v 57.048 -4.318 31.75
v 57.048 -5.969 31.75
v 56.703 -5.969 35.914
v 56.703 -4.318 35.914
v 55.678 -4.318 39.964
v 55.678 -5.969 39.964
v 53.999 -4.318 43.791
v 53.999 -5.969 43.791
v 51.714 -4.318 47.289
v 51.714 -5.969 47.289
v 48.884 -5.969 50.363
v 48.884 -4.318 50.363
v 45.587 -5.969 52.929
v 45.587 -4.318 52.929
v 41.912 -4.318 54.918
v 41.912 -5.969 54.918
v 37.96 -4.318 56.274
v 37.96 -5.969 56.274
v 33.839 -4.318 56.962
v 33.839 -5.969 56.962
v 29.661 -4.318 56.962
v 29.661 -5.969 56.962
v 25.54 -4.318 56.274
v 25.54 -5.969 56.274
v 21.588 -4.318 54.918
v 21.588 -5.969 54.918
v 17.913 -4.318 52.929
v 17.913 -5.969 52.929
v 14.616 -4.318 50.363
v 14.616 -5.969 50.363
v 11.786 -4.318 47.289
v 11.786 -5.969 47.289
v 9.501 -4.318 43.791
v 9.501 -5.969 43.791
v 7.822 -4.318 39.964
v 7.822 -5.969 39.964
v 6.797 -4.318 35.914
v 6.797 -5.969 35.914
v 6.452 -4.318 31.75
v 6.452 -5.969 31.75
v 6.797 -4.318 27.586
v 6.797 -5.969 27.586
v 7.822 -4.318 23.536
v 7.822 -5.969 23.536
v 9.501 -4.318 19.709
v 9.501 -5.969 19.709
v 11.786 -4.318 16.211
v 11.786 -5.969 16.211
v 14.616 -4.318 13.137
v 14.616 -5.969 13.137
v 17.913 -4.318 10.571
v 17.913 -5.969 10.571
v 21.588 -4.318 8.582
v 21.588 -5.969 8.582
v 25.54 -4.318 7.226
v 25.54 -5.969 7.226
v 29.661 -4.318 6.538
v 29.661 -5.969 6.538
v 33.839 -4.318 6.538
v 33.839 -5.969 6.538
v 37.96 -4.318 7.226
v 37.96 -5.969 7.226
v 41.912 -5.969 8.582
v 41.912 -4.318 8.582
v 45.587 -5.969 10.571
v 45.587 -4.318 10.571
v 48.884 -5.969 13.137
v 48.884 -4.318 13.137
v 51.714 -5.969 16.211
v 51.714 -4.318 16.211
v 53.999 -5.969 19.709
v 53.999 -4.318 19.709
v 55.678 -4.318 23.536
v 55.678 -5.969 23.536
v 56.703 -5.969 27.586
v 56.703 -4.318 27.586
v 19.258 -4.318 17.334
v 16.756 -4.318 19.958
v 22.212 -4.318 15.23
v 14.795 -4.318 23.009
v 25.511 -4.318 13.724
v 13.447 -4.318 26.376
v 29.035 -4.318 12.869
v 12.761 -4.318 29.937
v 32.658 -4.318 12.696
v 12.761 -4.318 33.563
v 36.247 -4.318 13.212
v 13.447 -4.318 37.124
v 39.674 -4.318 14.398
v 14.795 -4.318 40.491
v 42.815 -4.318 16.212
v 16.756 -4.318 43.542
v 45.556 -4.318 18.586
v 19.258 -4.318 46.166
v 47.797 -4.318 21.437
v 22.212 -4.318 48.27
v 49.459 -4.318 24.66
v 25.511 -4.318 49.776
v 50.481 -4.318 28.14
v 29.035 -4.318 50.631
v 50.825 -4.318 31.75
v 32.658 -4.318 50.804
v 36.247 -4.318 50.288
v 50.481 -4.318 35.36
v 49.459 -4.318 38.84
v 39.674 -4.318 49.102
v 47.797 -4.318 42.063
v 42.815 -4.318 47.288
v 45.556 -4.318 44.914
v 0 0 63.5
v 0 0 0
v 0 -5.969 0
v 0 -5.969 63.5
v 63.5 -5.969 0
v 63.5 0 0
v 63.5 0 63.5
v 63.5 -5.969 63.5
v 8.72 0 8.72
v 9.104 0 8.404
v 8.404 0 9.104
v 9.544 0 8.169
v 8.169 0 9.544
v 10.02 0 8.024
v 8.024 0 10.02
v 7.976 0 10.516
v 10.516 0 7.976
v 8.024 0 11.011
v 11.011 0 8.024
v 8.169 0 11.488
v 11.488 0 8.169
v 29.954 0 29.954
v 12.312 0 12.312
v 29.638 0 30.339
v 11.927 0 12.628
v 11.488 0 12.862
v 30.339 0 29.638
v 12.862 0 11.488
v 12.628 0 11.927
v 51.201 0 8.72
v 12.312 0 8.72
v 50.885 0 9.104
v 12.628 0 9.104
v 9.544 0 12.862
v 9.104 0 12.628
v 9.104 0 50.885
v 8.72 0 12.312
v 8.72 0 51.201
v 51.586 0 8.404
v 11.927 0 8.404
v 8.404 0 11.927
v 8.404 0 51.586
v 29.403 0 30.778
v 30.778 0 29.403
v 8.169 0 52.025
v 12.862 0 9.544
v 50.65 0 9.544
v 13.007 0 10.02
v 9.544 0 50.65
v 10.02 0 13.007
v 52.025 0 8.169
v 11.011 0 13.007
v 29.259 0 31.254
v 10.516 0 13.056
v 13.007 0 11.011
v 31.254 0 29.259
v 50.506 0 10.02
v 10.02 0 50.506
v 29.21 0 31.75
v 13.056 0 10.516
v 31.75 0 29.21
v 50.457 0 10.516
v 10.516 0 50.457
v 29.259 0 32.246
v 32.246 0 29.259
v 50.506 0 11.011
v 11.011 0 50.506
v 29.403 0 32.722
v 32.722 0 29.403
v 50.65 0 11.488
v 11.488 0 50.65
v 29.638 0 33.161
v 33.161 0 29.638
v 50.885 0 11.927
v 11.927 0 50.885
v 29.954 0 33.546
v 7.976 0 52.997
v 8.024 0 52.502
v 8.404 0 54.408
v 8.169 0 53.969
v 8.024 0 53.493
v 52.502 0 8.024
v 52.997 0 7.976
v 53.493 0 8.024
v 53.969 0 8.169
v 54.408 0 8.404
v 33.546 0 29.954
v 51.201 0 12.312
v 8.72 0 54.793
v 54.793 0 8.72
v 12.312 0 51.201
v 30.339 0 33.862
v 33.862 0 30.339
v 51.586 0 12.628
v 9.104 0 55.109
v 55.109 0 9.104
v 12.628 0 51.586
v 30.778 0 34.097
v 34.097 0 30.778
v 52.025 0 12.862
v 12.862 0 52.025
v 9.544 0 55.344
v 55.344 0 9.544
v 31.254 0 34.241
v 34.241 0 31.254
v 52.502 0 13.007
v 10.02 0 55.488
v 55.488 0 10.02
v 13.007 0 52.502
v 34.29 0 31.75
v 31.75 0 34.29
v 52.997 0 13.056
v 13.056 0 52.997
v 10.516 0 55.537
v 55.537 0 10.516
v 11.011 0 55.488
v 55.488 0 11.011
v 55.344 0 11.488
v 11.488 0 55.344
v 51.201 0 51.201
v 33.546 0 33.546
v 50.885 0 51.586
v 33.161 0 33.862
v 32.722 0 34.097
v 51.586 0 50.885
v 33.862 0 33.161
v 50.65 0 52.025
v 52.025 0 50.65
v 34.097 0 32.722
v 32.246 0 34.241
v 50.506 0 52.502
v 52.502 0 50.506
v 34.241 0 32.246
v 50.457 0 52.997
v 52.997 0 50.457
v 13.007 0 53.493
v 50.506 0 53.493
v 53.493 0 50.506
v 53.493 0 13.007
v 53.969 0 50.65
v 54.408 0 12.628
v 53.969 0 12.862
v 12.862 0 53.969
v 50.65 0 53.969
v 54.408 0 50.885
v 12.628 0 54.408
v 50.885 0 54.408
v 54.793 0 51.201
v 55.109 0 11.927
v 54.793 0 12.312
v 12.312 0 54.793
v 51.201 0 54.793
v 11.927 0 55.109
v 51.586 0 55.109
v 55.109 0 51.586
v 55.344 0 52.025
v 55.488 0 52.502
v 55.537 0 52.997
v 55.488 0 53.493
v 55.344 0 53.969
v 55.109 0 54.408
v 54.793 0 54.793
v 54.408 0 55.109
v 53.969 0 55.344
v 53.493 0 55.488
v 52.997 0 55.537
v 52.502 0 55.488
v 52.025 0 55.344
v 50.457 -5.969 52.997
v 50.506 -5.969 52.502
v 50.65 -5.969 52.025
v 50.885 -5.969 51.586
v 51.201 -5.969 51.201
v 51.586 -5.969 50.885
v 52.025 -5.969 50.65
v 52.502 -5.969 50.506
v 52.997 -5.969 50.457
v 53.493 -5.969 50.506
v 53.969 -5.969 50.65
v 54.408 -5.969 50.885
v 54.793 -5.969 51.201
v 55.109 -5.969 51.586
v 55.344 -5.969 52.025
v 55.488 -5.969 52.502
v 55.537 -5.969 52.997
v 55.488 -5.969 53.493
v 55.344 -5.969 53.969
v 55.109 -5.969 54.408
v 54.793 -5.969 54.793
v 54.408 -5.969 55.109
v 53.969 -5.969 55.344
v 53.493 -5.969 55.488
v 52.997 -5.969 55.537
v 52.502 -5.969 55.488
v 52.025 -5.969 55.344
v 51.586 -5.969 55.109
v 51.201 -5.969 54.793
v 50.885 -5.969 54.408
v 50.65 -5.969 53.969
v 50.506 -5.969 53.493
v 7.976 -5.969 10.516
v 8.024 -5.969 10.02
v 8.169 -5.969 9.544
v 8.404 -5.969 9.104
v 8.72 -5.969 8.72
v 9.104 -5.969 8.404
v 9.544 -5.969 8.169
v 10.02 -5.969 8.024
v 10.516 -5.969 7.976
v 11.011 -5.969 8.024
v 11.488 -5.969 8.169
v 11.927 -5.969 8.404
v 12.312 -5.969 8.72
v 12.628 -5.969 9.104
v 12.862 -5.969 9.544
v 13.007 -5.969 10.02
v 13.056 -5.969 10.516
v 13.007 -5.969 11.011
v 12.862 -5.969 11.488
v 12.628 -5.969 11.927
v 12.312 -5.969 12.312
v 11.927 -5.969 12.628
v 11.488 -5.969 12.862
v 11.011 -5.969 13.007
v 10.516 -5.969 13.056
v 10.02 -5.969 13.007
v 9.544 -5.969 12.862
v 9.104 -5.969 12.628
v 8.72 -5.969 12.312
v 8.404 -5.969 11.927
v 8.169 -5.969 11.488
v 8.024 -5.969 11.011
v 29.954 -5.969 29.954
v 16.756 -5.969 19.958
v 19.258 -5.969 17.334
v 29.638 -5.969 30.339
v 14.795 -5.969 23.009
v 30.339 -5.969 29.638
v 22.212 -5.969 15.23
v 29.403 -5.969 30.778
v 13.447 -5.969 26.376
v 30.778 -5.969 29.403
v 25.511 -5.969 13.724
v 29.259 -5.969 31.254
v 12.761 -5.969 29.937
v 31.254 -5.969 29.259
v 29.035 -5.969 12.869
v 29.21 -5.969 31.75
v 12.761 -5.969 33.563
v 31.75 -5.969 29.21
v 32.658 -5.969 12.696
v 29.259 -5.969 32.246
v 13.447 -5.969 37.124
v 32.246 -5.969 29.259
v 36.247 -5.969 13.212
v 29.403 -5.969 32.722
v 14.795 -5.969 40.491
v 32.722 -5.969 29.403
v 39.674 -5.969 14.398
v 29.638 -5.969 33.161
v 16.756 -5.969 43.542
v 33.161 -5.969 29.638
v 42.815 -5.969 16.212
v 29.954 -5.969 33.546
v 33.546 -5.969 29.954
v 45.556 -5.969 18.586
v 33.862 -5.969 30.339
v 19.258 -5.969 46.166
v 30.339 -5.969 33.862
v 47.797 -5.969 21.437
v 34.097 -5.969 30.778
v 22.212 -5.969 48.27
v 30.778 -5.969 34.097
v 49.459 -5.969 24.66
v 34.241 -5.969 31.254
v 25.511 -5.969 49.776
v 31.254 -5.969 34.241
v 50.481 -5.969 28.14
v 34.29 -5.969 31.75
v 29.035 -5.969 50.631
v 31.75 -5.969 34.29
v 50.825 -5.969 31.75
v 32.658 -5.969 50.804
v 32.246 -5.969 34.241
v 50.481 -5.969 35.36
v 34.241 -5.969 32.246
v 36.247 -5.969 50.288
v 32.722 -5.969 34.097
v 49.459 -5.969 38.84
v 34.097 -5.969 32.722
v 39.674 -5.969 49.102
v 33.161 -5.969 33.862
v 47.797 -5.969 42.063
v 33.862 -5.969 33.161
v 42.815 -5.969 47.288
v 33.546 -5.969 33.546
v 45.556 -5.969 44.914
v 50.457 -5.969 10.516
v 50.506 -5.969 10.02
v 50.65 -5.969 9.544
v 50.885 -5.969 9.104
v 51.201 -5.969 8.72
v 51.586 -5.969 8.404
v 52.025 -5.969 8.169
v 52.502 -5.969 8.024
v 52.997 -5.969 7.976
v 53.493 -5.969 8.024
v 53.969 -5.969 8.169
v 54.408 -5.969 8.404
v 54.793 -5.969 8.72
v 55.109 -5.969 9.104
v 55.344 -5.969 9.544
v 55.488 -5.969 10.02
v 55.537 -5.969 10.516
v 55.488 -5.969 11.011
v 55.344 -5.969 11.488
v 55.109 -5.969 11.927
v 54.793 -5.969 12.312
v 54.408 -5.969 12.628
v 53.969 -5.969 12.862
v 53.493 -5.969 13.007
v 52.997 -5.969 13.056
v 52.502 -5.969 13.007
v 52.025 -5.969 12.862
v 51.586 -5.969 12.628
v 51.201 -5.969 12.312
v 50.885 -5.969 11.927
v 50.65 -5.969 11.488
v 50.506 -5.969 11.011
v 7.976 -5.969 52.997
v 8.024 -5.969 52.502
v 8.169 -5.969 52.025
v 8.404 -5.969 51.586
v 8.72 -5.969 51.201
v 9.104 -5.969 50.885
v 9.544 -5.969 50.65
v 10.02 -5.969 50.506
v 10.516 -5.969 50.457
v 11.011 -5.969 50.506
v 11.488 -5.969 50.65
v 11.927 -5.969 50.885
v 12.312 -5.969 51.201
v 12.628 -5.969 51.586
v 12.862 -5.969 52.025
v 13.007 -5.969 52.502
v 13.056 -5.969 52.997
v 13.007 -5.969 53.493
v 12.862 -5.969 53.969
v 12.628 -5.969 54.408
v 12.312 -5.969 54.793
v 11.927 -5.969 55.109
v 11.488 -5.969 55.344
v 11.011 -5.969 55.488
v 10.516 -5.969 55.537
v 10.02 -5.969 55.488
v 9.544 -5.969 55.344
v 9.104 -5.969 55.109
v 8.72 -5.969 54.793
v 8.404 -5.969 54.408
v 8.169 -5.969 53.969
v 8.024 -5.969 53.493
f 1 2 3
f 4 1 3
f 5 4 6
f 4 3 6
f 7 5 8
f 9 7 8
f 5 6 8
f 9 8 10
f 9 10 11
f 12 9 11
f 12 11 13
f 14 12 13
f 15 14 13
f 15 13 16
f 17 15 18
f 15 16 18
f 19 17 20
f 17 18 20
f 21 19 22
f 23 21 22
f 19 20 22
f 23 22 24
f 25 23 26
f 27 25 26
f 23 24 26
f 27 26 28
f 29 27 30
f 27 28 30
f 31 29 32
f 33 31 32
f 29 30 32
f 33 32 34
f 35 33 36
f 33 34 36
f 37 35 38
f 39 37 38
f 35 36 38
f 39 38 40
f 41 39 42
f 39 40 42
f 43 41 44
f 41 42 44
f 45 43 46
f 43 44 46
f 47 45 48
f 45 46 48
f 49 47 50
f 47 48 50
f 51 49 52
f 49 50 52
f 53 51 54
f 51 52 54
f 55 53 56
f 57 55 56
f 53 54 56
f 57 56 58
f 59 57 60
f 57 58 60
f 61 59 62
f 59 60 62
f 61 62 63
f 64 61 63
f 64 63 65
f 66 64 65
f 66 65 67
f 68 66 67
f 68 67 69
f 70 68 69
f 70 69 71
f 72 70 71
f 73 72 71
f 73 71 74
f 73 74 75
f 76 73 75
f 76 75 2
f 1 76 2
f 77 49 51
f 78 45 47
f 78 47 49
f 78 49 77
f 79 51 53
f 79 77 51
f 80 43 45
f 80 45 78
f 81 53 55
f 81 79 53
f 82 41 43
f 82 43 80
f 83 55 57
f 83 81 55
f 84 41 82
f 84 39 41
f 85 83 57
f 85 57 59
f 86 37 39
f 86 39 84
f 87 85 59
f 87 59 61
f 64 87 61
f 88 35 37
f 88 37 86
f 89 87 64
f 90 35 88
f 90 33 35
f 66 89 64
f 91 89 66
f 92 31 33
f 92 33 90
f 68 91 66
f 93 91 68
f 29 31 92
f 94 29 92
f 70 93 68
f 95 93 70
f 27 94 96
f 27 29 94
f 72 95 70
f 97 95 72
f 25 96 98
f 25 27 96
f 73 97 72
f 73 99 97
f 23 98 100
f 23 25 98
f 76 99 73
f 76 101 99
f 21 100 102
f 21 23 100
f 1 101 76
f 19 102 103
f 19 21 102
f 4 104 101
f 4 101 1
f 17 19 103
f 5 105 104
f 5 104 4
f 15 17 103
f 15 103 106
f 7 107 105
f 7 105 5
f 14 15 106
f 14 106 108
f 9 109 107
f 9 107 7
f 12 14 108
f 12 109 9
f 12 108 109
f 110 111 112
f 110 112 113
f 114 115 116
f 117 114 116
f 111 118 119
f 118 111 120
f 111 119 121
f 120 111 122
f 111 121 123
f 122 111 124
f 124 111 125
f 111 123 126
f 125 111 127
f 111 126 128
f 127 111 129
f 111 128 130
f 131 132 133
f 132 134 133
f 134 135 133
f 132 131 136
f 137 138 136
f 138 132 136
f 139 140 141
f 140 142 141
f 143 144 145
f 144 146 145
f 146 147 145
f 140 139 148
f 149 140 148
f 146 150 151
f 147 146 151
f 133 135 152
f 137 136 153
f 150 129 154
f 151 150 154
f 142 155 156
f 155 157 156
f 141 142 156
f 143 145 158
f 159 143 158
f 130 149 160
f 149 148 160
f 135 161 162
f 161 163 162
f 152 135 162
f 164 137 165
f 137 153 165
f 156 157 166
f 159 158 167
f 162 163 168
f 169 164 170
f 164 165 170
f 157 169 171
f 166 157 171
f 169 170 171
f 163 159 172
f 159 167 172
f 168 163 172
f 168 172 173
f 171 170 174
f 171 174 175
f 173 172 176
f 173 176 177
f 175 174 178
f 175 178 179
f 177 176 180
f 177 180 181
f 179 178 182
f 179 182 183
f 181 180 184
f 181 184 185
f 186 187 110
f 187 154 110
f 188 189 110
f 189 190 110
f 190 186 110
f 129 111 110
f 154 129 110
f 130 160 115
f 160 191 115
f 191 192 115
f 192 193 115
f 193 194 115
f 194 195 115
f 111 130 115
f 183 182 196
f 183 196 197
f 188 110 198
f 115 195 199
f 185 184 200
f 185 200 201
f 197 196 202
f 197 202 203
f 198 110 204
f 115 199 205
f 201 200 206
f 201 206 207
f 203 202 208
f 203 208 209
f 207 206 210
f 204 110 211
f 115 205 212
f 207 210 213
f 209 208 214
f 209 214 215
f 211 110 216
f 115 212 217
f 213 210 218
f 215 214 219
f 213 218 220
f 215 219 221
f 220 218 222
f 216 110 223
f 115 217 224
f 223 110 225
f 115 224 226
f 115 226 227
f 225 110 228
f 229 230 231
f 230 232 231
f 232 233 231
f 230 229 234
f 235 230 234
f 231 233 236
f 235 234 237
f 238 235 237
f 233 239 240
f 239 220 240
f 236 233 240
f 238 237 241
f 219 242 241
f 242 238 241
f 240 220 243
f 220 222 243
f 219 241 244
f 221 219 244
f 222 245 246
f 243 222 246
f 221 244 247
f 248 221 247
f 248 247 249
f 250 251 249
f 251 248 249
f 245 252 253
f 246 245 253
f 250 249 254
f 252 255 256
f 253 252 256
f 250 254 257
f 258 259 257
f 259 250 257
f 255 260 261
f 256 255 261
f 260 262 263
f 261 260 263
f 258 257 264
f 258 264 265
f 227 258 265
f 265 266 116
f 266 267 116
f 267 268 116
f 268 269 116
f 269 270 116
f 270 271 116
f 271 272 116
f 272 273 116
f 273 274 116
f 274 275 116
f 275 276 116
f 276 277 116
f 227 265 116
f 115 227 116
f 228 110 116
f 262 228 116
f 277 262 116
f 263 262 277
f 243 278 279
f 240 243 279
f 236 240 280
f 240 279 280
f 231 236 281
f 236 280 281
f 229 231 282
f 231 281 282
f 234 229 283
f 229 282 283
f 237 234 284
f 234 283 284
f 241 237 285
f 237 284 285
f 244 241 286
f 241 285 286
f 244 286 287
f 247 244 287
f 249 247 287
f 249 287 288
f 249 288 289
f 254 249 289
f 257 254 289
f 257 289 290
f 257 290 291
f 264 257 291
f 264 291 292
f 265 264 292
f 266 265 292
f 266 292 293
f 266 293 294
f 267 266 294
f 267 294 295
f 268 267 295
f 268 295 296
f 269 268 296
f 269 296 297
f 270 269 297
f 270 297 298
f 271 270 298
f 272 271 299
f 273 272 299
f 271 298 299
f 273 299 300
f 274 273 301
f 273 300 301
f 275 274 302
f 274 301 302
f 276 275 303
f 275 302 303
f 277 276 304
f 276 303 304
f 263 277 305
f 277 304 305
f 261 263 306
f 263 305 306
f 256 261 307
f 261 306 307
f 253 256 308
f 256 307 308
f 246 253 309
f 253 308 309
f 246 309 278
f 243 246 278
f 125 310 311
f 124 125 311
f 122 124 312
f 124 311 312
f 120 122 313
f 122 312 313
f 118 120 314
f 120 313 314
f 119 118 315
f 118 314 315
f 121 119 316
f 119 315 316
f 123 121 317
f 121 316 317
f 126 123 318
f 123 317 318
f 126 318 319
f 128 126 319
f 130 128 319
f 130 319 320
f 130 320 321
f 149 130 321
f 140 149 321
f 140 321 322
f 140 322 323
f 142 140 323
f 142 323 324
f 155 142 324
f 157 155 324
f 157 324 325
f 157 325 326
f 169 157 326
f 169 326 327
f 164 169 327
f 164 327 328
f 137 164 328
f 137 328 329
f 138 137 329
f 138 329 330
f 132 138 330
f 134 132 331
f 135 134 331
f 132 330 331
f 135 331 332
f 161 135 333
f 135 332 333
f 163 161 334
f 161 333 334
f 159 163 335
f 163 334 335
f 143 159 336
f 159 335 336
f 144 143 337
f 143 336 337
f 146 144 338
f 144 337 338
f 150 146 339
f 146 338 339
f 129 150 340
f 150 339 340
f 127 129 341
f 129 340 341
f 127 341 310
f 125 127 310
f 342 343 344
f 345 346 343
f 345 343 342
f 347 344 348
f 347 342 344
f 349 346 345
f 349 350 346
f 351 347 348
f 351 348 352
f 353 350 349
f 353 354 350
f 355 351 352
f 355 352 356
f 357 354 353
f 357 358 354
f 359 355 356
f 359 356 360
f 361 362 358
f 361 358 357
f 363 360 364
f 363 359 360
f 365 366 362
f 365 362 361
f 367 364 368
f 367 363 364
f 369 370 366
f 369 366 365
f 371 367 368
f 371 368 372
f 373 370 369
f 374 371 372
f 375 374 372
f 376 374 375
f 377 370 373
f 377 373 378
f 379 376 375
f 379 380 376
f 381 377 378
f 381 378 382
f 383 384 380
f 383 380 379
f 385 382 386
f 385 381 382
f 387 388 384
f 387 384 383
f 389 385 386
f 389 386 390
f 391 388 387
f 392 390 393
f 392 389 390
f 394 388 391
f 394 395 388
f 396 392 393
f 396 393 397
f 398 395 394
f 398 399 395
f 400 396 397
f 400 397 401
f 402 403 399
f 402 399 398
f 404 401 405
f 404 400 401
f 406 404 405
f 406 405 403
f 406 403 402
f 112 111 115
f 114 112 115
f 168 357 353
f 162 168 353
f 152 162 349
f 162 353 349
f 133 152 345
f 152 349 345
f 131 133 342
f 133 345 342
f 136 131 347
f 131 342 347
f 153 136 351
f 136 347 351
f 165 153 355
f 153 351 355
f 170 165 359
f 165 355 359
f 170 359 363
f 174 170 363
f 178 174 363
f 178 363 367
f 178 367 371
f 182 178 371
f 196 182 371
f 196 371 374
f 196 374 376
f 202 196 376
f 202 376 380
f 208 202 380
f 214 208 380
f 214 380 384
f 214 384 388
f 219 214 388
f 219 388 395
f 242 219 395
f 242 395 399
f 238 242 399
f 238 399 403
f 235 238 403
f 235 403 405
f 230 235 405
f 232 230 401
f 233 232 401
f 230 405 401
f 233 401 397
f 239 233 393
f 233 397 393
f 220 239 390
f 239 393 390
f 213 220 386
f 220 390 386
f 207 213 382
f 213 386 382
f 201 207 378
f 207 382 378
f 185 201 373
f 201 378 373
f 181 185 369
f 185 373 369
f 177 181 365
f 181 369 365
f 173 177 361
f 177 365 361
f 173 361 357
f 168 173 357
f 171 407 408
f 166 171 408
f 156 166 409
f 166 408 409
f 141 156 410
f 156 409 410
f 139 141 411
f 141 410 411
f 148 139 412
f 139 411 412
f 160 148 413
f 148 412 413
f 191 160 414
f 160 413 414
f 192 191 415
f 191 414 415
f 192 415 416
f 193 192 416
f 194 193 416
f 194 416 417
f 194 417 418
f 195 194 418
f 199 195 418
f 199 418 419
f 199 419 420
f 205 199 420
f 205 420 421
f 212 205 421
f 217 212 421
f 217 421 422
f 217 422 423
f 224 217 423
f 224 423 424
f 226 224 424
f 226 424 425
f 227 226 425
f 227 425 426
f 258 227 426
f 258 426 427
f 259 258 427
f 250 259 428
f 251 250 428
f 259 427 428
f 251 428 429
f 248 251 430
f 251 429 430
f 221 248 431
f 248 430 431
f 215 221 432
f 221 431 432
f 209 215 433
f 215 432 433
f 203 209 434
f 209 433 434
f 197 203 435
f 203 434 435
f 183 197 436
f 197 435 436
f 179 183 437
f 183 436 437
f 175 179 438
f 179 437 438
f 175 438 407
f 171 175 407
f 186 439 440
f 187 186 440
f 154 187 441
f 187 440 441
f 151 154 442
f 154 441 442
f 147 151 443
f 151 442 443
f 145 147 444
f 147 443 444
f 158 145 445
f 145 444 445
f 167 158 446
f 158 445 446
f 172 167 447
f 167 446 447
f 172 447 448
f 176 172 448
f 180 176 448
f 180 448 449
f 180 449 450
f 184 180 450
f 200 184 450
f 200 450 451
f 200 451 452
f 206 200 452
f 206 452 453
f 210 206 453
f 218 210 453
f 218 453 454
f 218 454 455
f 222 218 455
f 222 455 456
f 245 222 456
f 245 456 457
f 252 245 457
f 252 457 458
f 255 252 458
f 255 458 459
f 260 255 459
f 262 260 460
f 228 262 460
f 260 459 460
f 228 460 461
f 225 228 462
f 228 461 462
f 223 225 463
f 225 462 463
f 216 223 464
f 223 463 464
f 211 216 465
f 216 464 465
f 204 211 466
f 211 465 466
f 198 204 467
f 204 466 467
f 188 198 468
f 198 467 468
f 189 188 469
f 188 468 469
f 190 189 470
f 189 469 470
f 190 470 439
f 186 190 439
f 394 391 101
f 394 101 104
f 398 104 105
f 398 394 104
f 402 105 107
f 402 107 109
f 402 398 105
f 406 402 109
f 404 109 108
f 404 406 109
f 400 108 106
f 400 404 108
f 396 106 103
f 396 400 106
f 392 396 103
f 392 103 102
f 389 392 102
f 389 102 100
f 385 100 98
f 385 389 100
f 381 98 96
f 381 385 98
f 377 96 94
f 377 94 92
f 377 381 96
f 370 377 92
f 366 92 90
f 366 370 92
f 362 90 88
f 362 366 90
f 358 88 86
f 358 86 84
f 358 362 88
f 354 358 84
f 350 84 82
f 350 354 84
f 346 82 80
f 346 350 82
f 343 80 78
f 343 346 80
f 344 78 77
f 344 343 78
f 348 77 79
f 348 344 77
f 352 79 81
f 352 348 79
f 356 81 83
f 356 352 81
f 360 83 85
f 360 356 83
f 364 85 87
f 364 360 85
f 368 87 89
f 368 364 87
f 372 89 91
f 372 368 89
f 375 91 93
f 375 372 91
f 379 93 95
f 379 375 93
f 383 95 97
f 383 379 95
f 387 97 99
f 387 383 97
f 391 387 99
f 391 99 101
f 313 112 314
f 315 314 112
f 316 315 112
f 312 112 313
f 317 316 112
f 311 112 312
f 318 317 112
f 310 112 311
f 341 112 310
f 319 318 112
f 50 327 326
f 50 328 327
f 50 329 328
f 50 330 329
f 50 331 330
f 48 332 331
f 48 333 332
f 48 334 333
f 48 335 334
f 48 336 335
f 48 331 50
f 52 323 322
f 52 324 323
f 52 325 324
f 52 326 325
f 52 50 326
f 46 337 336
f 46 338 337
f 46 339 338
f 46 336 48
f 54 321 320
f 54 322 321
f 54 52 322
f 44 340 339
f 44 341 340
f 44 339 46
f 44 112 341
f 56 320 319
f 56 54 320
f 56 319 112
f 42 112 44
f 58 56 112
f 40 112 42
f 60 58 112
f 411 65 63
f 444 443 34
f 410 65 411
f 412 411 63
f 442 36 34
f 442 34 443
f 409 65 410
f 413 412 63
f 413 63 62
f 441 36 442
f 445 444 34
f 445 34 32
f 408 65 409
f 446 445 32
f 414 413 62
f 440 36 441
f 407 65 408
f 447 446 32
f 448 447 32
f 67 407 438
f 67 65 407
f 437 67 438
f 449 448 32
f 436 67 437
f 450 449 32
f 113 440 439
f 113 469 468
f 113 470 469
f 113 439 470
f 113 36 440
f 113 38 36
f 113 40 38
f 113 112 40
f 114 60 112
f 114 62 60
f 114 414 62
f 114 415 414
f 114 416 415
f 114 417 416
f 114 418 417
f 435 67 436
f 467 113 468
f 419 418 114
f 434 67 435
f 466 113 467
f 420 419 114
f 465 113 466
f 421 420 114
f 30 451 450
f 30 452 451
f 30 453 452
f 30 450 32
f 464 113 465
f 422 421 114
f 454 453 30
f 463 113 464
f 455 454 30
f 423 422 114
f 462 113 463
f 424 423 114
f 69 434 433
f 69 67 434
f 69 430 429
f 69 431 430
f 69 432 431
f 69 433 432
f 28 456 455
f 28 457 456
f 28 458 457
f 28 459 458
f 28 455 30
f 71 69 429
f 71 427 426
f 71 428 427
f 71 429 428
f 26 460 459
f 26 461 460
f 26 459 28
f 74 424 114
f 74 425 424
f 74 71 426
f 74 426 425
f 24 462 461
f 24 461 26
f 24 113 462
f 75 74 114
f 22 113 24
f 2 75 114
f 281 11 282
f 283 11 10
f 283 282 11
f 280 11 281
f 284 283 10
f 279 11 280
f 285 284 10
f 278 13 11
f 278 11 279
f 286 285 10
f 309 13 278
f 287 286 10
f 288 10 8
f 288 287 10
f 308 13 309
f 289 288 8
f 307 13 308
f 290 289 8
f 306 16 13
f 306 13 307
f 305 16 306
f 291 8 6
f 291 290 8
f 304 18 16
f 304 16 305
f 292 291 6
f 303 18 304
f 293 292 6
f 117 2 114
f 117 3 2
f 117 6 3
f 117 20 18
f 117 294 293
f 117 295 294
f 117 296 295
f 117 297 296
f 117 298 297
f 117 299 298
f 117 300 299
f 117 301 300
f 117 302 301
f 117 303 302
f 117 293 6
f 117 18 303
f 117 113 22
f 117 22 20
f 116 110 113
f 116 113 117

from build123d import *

# Parameters (mm, degrees)
F0_W     = 63.5
F0_H     = 63.5
F0_R     = 25.2984
F0_R_2   = 19.0754
F1_DEPTH = 5.969
F3_R     = 25.2984
F3_R_2   = 19.0754
F4_DEPTH = 1.651
F5_D     = 5.08


with BuildPart() as f1:
    # F0 (on Front) → F1 (new body)
    with BuildSketch(Plane.XZ):
        with Locations((31.75, 31.75)):
            Rectangle(F0_W, F0_H)
        with Locations((31.75, 31.75)):
            Circle(F0_R, mode=Mode.SUBTRACT)
        with Locations((31.75, 31.75)):
            Circle(F0_R)
        with Locations((31.75, 31.75)):
            Circle(F0_R_2, mode=Mode.SUBTRACT)
        with Locations((31.75, 31.75)):
            Circle(F0_R_2)
    extrude(amount=F1_DEPTH)

    # F3 (on face) → F4 (cut)
    with BuildSketch(Plane.XZ.offset(5.969)):
        with Locations((31.75, 31.75)):
            Circle(F3_R)
        with Locations((31.75, 31.75)):
            Circle(F3_R_2, mode=Mode.SUBTRACT)
    extrude(amount=-F4_DEPTH, mode=Mode.SUBTRACT)

    # F5 (through all)
    with Locations(Plane(origin=(0, 0, 0), x_dir=(1, 0, 0), z_dir=(0, 1, 0))):
        with Locations((10.5156, -52.9971), (52.9971, -52.9971), (10.5156, -10.5156), (52.9971, -10.5156), (31.75, -31.75)):
            Hole(F5_D / 2)


solid = f1.part
